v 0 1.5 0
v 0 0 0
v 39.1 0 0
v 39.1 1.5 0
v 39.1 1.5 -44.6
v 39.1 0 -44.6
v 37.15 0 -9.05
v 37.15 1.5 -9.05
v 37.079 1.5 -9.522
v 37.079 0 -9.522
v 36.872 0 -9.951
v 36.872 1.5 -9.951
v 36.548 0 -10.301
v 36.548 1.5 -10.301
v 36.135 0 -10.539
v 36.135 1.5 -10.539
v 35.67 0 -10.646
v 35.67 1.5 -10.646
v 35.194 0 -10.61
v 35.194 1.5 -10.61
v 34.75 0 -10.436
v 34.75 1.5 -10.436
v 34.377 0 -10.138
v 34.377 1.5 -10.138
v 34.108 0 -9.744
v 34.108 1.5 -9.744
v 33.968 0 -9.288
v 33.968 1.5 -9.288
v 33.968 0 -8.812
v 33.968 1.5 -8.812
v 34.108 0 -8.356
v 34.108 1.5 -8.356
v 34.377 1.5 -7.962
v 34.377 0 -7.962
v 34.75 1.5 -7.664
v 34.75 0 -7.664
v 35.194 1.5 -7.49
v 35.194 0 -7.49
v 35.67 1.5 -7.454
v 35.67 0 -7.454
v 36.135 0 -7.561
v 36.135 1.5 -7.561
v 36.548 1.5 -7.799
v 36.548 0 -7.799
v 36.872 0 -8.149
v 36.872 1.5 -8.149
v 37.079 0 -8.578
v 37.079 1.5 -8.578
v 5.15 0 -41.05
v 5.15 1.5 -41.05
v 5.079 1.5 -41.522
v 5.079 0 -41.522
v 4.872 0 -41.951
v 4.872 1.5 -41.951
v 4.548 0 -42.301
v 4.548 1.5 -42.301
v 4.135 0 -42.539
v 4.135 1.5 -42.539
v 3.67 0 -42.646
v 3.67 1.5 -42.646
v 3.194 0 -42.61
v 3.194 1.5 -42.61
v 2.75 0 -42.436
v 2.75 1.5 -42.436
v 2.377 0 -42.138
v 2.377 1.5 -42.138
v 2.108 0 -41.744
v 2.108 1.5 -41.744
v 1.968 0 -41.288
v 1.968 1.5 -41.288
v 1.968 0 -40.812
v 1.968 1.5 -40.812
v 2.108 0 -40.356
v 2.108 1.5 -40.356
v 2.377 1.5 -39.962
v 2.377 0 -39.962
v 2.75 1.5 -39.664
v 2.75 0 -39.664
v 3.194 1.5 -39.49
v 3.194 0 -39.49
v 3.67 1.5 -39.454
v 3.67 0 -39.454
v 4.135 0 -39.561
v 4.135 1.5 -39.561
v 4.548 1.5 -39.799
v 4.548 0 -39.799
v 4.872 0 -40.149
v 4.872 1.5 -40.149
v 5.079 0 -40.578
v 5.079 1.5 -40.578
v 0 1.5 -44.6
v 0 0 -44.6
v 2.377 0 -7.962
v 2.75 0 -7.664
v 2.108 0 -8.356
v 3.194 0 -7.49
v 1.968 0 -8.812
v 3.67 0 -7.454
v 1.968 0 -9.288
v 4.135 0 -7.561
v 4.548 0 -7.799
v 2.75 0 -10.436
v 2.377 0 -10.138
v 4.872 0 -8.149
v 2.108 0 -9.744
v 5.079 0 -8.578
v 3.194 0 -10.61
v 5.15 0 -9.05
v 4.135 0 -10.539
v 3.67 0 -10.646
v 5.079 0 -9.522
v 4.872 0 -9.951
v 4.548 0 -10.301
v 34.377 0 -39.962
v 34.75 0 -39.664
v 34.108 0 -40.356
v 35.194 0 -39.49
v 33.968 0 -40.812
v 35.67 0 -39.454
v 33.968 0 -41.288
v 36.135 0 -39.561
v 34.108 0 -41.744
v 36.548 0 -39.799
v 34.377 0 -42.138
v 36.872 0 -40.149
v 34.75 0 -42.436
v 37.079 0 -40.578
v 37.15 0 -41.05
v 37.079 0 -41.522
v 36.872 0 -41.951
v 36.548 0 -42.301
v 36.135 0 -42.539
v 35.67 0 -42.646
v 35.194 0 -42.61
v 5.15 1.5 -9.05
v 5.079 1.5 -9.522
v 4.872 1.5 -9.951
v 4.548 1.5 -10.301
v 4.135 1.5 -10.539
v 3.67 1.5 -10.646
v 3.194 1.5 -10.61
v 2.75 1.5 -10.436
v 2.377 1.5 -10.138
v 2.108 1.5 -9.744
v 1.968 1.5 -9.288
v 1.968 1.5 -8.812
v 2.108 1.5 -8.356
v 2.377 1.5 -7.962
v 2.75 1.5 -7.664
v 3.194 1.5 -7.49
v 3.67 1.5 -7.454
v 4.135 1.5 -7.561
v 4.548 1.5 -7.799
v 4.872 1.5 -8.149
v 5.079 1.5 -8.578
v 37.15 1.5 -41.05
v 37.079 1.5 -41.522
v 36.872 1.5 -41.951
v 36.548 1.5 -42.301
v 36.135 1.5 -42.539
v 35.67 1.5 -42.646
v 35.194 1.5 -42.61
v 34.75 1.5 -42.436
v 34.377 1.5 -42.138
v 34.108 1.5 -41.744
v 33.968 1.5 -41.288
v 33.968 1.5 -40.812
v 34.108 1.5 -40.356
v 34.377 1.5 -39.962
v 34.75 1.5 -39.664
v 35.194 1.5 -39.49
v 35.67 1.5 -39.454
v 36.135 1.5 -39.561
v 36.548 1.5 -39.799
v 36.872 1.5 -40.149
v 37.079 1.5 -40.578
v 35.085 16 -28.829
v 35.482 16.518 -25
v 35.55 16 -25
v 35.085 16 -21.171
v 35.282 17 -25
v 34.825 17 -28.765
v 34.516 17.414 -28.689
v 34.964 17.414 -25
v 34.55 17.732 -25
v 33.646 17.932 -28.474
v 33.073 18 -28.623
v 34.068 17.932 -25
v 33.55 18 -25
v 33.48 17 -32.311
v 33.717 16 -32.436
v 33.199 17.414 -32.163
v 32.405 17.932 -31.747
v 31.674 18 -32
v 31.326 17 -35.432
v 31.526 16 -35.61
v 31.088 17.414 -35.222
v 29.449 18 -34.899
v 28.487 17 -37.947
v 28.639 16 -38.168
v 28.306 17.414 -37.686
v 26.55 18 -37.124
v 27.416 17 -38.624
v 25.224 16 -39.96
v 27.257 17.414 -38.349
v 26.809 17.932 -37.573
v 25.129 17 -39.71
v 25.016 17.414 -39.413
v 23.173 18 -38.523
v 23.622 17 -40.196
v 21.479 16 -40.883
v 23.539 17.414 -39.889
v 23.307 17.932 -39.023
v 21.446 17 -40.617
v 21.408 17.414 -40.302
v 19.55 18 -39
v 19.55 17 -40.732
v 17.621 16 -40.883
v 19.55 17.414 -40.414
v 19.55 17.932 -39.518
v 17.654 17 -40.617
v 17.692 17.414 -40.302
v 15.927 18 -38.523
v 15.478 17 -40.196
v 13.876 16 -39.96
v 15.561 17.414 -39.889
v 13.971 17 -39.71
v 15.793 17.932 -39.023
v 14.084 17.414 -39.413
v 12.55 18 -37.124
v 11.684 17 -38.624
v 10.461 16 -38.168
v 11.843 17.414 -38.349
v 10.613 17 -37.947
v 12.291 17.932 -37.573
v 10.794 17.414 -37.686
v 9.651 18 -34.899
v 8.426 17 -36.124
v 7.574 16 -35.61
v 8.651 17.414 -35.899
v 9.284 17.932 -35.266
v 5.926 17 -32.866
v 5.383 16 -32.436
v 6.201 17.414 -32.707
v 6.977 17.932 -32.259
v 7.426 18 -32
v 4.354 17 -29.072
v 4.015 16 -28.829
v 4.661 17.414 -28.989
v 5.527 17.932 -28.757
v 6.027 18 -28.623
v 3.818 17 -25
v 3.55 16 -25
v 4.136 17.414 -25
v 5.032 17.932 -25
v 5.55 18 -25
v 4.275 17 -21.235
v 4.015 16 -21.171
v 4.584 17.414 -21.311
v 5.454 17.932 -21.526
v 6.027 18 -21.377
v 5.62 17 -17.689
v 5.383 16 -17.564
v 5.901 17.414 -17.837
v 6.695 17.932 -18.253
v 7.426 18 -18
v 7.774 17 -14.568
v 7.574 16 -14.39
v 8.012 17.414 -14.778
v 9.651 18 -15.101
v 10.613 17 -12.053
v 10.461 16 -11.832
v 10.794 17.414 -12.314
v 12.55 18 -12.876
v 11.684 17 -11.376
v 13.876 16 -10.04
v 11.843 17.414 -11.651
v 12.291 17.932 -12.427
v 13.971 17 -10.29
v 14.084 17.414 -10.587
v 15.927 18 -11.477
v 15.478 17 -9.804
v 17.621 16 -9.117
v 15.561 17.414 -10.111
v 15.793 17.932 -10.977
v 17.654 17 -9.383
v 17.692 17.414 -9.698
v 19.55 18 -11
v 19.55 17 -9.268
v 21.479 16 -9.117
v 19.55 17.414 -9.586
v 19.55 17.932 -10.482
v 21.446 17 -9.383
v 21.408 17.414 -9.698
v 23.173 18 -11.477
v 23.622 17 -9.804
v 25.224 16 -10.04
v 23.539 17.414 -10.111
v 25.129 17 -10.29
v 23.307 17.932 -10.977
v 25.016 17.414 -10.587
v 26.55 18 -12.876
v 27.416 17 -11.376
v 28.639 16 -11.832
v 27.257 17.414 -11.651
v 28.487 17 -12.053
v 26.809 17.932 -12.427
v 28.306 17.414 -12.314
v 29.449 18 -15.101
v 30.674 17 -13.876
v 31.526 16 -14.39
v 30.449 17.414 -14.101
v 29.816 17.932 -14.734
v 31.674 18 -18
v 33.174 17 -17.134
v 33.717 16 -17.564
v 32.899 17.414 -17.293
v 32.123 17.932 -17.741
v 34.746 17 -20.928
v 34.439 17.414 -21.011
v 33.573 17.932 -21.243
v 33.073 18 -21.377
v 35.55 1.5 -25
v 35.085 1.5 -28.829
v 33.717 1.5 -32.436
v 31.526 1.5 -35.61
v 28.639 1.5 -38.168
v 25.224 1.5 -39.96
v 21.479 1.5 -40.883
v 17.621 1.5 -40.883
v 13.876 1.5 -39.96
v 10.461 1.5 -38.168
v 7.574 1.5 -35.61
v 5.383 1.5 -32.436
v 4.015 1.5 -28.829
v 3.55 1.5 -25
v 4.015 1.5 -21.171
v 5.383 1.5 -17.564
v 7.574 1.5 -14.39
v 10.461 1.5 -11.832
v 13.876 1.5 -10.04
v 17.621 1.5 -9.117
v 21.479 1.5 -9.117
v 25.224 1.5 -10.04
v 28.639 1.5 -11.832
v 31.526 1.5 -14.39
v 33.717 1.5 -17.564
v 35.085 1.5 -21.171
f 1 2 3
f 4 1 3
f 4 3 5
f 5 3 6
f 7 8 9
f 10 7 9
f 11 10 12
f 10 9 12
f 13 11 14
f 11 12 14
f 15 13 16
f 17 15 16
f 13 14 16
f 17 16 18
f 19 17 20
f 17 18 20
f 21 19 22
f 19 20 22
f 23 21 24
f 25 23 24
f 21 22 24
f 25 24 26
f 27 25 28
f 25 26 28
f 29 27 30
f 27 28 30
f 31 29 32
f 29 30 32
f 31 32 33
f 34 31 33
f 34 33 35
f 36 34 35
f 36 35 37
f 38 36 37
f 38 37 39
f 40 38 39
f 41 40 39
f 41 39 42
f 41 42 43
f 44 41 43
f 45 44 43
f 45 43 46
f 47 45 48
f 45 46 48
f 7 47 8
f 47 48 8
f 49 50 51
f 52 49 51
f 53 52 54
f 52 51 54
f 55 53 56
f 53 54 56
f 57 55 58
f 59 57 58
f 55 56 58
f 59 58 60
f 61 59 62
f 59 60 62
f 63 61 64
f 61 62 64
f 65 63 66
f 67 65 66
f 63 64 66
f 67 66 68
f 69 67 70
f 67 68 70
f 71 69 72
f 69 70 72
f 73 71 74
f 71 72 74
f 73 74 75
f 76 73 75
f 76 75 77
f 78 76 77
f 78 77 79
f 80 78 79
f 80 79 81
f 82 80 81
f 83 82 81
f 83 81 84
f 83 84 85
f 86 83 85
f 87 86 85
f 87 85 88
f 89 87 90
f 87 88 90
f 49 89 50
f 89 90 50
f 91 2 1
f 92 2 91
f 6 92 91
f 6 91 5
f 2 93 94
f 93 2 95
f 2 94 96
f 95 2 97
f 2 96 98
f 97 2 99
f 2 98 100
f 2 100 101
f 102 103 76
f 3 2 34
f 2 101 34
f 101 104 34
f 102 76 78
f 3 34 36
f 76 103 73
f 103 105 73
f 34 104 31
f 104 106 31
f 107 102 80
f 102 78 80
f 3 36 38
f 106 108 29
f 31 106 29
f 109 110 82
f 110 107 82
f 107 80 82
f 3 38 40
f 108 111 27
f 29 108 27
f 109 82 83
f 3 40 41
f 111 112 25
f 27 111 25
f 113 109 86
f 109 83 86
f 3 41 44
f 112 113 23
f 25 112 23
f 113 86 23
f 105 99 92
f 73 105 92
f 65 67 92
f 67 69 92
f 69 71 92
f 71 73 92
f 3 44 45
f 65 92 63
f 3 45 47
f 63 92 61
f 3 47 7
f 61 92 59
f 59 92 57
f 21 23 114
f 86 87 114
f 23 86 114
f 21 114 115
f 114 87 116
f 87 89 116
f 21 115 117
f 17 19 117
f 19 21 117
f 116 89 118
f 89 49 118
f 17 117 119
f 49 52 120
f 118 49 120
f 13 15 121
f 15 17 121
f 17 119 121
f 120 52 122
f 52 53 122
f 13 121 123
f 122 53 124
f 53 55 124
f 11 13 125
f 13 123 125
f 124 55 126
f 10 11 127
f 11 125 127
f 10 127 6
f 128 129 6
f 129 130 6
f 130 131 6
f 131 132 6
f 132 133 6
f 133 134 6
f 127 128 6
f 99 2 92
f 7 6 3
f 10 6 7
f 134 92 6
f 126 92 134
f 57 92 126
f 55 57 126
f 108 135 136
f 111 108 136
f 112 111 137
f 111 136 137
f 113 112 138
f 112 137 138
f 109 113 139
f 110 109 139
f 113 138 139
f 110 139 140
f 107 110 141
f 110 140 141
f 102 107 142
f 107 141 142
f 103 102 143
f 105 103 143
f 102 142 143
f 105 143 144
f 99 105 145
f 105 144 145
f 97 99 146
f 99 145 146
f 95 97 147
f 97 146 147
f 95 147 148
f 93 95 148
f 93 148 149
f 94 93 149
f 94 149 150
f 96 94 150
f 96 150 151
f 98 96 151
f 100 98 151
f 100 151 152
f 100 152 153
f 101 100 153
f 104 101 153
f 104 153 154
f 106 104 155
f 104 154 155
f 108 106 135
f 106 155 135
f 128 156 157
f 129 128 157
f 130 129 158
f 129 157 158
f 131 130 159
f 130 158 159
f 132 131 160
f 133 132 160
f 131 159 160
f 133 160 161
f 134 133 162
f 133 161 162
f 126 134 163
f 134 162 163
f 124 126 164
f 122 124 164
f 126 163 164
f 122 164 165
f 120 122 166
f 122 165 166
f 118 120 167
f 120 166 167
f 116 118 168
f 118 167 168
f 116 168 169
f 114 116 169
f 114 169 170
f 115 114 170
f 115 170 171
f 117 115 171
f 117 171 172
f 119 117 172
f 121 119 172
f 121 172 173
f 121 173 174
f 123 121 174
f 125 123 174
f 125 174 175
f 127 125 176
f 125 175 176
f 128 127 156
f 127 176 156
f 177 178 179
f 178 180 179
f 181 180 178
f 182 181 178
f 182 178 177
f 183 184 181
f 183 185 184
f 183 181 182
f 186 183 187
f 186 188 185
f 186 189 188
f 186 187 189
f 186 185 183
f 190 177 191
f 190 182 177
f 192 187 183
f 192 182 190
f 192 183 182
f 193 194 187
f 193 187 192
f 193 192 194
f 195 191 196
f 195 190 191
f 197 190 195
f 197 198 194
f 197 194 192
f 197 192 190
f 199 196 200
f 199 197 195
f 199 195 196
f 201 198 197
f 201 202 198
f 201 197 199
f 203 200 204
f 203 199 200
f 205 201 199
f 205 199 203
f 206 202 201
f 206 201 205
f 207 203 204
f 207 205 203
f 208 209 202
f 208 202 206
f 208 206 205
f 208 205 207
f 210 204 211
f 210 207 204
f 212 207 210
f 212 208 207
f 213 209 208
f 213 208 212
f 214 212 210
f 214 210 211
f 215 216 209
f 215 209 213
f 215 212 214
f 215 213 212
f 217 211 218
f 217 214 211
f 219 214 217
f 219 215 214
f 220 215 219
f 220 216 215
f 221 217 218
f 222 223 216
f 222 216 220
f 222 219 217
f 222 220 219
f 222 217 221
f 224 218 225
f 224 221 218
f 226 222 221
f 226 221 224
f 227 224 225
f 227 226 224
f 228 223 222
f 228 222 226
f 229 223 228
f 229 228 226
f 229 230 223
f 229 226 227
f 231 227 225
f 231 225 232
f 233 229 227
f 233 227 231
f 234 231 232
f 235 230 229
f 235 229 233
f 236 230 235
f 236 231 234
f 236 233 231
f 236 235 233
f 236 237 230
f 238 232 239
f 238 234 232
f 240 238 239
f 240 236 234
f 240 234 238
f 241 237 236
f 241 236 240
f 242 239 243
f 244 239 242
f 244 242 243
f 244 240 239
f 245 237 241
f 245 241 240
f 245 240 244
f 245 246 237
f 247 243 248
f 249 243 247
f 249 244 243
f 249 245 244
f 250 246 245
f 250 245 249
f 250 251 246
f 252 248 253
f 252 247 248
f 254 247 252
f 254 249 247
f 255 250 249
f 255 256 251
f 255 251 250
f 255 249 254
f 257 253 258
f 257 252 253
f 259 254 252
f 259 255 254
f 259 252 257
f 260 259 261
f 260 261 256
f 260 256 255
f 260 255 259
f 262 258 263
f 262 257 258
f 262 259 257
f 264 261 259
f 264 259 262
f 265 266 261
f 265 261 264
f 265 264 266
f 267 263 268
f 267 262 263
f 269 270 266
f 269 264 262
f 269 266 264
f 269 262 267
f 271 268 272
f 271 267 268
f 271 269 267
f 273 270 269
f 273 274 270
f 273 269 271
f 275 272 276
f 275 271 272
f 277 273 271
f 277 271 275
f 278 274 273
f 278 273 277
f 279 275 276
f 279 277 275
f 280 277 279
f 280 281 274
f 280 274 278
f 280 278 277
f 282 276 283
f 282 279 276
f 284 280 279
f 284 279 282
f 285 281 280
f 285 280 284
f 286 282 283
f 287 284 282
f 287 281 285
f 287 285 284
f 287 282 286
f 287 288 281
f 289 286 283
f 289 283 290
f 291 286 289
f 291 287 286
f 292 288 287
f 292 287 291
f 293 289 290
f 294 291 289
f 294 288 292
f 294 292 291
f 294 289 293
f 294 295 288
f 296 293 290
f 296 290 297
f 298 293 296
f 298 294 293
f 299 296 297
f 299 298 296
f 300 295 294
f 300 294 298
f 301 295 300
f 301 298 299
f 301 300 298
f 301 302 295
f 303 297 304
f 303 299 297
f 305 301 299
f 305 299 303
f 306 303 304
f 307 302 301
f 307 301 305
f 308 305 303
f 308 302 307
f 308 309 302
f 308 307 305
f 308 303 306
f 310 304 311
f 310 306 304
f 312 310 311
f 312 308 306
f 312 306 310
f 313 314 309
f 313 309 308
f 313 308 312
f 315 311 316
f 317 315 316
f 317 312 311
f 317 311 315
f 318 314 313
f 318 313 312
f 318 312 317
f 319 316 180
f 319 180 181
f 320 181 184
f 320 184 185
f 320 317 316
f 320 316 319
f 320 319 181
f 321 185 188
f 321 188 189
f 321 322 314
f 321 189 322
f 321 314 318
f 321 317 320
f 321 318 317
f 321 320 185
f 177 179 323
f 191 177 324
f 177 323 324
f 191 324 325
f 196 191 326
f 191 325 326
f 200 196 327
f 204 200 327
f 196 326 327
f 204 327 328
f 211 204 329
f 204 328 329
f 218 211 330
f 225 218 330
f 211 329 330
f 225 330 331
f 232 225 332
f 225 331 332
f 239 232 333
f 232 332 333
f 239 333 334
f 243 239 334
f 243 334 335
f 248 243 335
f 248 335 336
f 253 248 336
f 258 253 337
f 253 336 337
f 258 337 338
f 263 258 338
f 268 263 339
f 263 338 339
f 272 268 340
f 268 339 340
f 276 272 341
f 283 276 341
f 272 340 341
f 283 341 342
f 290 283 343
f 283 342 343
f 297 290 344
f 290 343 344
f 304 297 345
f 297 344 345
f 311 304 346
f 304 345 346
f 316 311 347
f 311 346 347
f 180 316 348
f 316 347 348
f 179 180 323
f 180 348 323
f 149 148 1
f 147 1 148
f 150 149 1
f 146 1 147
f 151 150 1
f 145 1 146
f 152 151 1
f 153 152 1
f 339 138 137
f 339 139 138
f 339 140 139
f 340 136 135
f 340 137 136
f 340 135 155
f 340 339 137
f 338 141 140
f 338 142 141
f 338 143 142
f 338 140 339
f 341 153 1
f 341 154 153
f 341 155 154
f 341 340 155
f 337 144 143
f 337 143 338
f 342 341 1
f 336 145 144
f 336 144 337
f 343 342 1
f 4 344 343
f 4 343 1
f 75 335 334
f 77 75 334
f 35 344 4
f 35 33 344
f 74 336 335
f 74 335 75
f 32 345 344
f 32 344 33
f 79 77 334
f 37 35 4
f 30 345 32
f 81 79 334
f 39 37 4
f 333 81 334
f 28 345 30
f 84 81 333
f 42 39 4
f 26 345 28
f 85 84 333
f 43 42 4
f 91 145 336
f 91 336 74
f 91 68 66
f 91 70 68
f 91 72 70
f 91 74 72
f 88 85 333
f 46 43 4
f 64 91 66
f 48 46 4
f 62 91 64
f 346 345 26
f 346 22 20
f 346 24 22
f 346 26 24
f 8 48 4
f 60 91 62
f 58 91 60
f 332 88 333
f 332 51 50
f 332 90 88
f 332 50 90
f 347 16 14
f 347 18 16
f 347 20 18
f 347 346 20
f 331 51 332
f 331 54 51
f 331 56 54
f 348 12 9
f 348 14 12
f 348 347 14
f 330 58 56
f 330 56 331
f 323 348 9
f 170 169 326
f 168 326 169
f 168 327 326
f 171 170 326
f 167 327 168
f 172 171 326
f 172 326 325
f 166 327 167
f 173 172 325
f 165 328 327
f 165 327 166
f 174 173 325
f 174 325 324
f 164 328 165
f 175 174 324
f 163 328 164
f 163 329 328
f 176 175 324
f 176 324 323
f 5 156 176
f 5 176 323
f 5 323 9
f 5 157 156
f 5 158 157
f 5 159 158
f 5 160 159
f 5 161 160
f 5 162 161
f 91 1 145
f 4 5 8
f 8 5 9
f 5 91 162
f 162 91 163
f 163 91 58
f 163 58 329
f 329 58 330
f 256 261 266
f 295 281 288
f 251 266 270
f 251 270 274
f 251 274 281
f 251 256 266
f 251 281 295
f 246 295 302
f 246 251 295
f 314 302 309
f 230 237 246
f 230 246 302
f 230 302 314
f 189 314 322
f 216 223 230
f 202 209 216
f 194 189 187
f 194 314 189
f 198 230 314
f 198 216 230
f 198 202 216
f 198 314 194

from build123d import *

# Parameters (mm, degrees)
SKETCH1_W           = 39.1
SKETCH1_H           = 44.6
BOSS_EXTRUDE1_DEPTH = 1.5
SKETCH2_R           = 1.6
CUT_EXTRUDE1_DEPTH  = 1.5
SKETCH3_R           = 16
BOSS_EXTRUDE2_DEPTH = 16.5
FILLET1_R           = 2


with BuildPart() as part:
    # Sketch1 → Boss-Extrude1 (new body)
    with BuildSketch(Plane(origin=(0, 0, 0), x_dir=(1, 0, 0), z_dir=(0, 1, 0))):
        with Locations((19.55, 22.3)):
            Rectangle(SKETCH1_W, SKETCH1_H)
    extrude(amount=BOSS_EXTRUDE1_DEPTH)

    # Sketch2 → Cut-Extrude1 (cut)
    with BuildSketch(Plane(origin=(0, 1.5, 0), x_dir=(1, 0, 0), z_dir=(0, 1, 0))):
        with Locations((35.55, 9.05)):
            Circle(SKETCH2_R)
        with Locations((35.55, 41.05)):
            Circle(SKETCH2_R)
        with Locations((3.55, 41.05)):
            Circle(SKETCH2_R)
        with Locations((3.55, 9.05)):
            Circle(SKETCH2_R)
    extrude(amount=-CUT_EXTRUDE1_DEPTH, mode=Mode.SUBTRACT)

    # Sketch3 → Boss-Extrude2 (add)
    with BuildSketch(Plane(origin=(0, 1.5, 0), x_dir=(1, 0, 0), z_dir=(0, 1, 0))):
        with Locations((19.55, 25)):
            Circle(SKETCH3_R)
    extrude(amount=BOSS_EXTRUDE2_DEPTH)

    # Fillet1
    fillet1_edges = [part.edges().sort_by_distance(p)[0] for p in [
        (3.55, 18, -25),
    ]]
    fillet(fillet1_edges, radius=FILLET1_R)


solid = part.part
